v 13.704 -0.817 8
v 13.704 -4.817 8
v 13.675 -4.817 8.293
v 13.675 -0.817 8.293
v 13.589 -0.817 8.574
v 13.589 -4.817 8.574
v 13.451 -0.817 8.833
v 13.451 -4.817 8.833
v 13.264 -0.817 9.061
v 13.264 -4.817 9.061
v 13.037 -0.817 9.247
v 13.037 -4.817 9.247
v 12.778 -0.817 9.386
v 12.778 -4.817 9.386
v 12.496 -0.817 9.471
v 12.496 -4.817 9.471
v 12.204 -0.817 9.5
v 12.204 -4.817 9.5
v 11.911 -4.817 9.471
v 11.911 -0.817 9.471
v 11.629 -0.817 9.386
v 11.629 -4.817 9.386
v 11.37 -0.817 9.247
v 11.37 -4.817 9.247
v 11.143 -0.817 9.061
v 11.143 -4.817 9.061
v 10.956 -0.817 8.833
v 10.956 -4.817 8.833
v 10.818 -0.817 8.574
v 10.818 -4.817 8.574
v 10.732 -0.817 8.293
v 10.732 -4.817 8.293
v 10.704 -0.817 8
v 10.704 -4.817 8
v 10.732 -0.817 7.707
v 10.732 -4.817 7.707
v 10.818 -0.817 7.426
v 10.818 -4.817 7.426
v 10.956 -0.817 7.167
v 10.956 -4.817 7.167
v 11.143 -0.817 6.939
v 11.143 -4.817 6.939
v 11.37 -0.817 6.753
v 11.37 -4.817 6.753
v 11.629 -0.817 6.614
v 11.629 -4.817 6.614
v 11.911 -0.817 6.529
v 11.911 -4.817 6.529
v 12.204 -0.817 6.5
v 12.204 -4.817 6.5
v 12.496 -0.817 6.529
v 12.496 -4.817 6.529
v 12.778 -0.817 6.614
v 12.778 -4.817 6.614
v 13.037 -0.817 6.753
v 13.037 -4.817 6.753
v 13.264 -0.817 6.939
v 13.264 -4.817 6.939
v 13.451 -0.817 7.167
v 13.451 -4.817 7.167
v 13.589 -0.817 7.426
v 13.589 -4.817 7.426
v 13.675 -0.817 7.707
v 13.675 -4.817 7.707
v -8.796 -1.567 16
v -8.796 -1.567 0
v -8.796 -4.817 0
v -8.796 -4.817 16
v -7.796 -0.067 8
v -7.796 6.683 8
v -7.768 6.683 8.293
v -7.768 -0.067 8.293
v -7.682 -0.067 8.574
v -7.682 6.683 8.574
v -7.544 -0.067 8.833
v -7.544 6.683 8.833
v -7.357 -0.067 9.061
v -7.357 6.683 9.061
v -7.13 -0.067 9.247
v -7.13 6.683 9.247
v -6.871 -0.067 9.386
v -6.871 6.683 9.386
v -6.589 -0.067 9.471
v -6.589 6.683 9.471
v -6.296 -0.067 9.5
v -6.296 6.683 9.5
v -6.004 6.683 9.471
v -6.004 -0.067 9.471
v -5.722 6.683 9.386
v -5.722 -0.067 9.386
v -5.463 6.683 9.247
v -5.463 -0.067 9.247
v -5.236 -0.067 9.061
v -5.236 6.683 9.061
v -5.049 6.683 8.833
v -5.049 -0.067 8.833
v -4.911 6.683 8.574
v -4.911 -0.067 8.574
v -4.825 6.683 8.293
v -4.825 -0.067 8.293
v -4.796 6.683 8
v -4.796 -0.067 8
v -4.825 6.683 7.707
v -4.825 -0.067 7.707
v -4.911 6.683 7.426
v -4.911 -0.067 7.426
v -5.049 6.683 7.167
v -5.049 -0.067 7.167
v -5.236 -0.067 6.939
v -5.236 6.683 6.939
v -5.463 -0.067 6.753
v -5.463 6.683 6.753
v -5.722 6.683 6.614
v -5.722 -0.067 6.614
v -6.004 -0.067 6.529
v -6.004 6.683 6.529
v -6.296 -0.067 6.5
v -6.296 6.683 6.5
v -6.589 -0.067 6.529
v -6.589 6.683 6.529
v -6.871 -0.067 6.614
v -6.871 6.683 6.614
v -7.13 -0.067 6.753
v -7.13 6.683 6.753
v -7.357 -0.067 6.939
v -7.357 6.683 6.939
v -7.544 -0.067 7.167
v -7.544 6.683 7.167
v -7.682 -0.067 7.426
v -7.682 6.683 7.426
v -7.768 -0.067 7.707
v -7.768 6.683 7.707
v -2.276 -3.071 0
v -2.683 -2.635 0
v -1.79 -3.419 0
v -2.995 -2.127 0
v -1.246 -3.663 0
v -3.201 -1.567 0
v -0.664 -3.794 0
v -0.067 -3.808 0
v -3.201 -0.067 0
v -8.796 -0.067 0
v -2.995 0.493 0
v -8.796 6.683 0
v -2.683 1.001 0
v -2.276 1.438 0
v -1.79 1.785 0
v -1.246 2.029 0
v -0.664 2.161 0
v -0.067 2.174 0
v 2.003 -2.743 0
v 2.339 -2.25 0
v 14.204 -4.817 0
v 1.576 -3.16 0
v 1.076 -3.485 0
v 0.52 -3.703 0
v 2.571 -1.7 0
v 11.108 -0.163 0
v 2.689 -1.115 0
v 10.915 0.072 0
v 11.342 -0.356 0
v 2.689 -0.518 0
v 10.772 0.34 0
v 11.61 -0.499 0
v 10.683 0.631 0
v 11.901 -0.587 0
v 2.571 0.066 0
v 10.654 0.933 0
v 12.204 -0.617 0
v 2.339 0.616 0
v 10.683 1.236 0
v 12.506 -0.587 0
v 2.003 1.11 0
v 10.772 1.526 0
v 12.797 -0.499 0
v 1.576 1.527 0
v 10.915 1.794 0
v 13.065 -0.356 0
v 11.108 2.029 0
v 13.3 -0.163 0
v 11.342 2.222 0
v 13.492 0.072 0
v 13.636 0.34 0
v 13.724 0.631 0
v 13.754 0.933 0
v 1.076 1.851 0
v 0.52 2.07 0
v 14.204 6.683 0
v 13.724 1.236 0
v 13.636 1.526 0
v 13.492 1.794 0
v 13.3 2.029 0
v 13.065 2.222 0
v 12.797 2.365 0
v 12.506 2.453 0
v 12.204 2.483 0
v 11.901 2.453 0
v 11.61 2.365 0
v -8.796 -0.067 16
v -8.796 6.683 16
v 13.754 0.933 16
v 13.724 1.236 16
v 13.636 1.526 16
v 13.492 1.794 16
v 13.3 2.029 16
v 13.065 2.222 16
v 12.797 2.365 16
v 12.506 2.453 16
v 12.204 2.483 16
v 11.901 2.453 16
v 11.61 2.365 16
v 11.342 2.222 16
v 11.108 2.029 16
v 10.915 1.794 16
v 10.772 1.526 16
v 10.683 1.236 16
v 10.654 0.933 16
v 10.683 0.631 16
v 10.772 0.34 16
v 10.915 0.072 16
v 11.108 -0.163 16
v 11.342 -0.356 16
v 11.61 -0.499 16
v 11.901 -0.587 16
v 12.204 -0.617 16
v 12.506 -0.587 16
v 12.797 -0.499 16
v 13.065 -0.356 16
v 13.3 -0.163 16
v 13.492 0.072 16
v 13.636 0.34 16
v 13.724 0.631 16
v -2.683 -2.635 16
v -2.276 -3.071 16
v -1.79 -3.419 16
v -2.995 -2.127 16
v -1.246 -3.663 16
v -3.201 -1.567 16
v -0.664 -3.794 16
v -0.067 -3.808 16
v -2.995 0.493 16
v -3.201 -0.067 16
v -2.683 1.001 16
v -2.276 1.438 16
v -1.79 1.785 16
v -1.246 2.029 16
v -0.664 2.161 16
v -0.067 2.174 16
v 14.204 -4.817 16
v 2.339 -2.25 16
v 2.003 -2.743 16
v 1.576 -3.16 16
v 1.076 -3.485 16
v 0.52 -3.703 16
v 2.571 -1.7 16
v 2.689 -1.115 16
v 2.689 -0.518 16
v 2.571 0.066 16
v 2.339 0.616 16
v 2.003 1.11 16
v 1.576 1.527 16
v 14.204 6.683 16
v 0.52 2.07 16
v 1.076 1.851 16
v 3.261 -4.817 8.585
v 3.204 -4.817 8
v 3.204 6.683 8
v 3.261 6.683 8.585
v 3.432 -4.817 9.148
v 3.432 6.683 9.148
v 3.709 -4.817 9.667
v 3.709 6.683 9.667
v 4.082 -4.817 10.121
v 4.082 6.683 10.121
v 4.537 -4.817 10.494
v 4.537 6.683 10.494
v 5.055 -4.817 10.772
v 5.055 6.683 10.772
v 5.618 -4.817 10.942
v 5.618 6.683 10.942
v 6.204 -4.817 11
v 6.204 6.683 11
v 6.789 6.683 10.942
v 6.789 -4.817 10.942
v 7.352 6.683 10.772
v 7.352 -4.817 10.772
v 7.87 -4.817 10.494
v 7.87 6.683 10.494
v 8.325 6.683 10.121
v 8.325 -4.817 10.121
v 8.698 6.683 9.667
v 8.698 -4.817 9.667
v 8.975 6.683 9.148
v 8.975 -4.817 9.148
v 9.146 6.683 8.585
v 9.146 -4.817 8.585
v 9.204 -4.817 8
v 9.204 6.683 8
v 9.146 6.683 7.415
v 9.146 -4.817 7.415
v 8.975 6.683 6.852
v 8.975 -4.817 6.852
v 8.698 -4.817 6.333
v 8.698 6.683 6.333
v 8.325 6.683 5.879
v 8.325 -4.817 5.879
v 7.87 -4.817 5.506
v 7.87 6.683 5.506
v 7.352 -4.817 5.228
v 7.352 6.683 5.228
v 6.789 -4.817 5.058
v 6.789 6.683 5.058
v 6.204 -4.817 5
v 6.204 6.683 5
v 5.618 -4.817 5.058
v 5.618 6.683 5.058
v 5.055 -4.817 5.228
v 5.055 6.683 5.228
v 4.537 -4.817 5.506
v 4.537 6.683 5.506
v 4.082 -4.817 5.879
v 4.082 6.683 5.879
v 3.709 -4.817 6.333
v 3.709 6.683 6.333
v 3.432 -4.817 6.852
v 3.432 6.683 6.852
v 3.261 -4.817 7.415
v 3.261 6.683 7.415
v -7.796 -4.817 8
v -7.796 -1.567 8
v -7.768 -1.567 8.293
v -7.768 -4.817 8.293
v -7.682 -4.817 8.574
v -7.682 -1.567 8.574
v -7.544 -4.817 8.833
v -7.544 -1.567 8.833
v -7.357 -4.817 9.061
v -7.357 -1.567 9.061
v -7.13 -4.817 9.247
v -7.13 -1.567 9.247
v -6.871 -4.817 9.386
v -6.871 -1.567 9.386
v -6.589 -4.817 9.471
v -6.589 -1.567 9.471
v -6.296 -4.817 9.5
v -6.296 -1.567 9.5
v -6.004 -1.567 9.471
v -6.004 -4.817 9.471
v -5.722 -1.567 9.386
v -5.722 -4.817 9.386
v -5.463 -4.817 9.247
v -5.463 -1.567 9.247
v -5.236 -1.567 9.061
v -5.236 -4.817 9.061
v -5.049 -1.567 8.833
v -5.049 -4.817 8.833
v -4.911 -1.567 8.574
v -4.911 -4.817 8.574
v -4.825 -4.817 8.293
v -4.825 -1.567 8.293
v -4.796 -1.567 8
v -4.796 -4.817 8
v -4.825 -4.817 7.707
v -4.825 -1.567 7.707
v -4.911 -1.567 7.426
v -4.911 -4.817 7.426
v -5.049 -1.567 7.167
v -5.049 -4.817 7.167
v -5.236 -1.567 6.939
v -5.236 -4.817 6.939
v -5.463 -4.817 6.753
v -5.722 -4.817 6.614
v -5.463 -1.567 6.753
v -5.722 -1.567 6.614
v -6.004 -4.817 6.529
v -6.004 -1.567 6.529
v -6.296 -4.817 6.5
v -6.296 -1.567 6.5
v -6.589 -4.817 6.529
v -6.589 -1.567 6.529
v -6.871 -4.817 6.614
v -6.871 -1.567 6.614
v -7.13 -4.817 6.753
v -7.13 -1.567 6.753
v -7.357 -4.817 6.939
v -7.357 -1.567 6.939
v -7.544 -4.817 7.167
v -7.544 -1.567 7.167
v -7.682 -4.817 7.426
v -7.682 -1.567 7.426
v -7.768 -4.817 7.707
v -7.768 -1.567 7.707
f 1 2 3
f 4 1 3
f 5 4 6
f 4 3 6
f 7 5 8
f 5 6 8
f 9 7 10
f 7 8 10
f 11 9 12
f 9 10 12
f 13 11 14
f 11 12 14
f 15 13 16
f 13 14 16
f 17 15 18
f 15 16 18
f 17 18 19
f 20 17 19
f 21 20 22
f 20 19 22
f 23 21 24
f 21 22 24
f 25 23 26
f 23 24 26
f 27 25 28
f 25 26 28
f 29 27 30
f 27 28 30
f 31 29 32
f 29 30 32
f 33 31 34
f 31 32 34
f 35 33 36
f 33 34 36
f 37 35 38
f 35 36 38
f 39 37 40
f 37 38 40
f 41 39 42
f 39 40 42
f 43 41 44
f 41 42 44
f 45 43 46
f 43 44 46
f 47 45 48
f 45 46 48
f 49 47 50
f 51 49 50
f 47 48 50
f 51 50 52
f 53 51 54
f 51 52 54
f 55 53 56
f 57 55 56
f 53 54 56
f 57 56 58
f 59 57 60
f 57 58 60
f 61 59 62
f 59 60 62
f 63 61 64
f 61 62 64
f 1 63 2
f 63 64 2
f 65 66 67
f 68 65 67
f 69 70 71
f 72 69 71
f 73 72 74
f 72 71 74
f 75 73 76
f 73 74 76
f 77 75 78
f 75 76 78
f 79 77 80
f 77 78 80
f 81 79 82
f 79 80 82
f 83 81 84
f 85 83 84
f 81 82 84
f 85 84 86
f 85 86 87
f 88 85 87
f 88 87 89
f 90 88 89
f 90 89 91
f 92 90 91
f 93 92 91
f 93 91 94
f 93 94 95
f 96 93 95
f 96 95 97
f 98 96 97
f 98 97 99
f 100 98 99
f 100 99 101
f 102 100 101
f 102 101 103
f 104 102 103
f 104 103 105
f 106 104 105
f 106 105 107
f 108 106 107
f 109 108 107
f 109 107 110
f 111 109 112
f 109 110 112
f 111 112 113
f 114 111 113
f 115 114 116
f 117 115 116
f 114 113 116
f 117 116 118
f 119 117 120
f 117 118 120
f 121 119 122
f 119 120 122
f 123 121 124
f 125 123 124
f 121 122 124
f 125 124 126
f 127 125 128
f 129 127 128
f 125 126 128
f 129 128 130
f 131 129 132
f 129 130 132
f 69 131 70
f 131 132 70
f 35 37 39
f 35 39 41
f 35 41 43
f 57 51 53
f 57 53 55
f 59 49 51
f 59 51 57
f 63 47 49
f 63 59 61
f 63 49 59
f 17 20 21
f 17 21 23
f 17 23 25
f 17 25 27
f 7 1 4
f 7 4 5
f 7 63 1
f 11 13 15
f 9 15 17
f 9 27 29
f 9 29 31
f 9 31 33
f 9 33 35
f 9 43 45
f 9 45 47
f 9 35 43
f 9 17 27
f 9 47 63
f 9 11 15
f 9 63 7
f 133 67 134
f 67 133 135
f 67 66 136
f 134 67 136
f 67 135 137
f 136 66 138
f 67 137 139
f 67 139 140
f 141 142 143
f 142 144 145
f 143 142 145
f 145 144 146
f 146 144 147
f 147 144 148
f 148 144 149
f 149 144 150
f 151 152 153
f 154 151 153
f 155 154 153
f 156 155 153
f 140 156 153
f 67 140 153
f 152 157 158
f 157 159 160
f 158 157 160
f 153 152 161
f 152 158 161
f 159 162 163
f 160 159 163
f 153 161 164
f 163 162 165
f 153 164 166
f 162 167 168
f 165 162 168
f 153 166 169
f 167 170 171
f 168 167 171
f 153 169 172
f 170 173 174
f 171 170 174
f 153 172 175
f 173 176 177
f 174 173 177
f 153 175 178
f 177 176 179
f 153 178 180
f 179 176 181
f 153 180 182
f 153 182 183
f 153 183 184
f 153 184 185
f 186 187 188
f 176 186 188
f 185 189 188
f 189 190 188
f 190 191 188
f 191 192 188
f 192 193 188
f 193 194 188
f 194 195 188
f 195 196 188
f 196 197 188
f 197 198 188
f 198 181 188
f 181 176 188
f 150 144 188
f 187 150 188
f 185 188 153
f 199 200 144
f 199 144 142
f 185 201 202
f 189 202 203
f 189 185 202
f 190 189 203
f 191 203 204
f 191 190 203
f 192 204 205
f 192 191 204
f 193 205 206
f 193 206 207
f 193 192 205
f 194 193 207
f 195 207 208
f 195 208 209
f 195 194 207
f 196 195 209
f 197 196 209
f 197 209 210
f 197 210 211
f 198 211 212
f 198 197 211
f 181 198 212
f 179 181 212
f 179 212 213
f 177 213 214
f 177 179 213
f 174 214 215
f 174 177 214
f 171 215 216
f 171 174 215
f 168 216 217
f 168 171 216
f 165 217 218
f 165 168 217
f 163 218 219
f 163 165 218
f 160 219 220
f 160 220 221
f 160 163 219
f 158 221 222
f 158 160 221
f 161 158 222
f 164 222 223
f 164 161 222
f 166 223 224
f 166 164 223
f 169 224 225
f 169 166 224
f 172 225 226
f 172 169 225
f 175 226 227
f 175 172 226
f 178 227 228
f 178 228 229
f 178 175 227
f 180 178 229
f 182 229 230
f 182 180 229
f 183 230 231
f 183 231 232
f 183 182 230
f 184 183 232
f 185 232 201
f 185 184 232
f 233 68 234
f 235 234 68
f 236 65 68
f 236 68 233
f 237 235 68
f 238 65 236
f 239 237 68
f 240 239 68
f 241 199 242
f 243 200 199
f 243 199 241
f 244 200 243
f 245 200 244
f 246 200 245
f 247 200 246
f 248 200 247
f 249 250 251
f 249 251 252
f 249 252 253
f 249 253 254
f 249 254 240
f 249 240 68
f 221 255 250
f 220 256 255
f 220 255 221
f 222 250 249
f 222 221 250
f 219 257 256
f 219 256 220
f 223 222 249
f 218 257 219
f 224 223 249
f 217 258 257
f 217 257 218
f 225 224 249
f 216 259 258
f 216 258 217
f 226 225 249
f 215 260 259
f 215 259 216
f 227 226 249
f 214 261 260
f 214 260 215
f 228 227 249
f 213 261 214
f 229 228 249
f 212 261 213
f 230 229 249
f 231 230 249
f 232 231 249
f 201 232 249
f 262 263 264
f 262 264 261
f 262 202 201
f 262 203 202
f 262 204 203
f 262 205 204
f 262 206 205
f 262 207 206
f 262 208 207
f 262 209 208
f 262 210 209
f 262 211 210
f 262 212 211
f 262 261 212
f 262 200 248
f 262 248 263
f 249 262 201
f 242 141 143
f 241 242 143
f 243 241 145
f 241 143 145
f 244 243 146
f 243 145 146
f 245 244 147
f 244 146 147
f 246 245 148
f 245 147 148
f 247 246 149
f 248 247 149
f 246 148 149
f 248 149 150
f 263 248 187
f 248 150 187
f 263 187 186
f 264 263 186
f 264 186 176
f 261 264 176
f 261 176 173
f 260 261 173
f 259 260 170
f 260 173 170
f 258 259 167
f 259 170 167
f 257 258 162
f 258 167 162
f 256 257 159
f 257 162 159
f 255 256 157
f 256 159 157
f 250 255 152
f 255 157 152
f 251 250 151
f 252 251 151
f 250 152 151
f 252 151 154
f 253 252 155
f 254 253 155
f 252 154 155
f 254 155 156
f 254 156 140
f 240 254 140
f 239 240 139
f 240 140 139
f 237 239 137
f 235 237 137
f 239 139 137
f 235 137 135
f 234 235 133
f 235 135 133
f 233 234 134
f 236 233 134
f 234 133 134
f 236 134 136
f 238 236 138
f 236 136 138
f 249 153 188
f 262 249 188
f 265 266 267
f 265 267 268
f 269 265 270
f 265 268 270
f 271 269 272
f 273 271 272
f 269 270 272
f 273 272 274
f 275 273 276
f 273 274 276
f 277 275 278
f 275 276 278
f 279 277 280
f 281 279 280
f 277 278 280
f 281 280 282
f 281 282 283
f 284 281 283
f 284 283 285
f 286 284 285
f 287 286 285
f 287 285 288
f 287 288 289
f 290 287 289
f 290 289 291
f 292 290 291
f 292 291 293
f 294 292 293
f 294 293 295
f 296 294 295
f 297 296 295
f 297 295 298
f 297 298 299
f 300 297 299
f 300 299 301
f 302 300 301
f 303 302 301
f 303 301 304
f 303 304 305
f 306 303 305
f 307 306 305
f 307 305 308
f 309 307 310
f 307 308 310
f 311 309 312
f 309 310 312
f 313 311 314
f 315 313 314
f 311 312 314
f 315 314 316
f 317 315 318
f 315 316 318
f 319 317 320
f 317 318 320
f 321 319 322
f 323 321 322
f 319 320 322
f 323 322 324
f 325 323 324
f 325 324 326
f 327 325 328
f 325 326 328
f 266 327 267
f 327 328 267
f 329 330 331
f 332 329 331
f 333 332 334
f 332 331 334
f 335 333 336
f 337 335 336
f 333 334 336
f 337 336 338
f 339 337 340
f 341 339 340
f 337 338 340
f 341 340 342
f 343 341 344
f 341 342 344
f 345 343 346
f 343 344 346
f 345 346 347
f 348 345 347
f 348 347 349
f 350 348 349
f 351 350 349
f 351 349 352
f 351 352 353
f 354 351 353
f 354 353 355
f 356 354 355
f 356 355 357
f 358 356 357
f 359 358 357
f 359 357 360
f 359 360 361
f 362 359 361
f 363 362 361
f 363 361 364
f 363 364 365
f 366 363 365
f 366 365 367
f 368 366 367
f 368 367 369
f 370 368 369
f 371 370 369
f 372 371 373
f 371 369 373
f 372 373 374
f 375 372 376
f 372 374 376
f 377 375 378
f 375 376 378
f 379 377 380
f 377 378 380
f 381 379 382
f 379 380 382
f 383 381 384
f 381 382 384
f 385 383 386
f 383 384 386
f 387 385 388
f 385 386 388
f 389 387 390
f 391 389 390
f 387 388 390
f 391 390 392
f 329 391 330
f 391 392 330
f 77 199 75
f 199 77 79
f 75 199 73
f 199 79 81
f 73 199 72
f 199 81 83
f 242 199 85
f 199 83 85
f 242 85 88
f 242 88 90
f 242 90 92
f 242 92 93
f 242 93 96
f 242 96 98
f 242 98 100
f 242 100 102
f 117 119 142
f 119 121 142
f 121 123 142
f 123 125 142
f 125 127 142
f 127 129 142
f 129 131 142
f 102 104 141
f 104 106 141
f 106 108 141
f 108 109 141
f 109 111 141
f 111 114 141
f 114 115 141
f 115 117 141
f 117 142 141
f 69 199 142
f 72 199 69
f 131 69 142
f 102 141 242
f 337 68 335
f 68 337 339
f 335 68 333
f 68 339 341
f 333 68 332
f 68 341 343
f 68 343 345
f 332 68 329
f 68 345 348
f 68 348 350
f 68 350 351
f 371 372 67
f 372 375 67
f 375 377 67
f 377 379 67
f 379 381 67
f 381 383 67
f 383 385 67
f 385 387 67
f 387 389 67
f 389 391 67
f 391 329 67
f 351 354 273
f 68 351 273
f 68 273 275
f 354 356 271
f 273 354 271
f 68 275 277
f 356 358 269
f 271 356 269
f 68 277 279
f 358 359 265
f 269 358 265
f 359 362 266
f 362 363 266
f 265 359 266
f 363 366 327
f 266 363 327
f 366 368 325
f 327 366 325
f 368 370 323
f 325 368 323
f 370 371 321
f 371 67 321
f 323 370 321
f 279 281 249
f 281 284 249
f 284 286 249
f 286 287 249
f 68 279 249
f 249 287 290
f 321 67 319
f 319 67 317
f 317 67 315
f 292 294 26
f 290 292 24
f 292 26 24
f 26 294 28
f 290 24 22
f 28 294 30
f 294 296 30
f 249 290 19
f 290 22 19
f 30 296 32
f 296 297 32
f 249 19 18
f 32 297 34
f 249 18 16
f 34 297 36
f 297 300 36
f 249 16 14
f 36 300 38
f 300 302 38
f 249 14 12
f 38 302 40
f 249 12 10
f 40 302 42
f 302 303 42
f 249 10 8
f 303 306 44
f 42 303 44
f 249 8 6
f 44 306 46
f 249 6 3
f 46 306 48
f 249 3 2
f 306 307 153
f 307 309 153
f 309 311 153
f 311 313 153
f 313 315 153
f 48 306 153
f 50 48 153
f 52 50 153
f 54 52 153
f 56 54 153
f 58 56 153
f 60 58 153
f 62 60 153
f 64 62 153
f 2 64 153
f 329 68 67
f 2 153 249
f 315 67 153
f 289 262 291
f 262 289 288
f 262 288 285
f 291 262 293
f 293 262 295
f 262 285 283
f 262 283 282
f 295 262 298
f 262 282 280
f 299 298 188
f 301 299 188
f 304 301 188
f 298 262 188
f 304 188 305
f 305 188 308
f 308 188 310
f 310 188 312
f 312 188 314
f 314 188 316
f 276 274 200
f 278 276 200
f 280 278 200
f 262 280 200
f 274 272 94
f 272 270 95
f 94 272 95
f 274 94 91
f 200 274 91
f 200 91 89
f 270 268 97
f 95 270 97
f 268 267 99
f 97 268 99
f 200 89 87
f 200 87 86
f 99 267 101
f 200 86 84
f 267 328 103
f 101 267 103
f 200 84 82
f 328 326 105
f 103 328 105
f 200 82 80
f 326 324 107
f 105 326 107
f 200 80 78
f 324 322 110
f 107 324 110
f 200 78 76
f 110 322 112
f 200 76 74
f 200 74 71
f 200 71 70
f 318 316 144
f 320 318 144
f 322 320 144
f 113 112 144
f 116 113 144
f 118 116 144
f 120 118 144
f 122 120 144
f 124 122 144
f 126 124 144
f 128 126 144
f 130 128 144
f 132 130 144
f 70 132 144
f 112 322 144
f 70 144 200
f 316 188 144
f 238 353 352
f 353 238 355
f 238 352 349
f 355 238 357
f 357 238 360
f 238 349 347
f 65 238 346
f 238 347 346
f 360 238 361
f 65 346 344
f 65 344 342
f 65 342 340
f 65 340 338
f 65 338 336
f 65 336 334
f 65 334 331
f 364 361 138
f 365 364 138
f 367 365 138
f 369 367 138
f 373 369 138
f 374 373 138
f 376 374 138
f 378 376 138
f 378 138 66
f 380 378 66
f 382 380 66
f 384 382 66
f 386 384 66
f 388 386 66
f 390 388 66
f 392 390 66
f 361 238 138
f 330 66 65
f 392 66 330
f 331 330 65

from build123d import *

# Parameters (mm, degrees)
SKETCH_1_R          = 1.55
EXTRUDE_2_DEPTH     = 16
SKETCH_2_R          = 1.5
SKETCH_2_R_2        = 3
CUT_EXTRUDE_1_DEPTH = 25.289710071
SKETCH_3_R          = 1.5
CUT_EXTRUDE_2_DEPTH = 4


with BuildPart() as part:
    # 草图1 → 凸台-拉伸2 (new body)
    with BuildSketch(Plane.XY):
        with BuildLine():
            Line((14.20352123, 6.683160013), (-8.79647877, 6.683160013))
            Line((-8.79647877, 6.683160013), (-8.79647877, -0.066839987))
            Line((-8.79647877, -0.066839987), (-3.20121628, -0.066839987))
            ThreePointArc((-3.20121628, -0.066839987), (2.70352123, -0.816839987), (-3.20121628, -1.566839987))
            Line((-3.20121628, -1.566839987), (-8.79647877, -1.566839987))
            Line((-8.79647877, -1.566839987), (-8.79647877, -4.816839987))
            Line((-8.79647877, -4.816839987), (14.20352123, -4.816839987))
            Line((14.20352123, -4.816839987), (14.20352123, 6.683160013))
        make_face()
        with Locations((12.20352123, 0.933160013)):
            Circle(SKETCH_1_R, mode=Mode.SUBTRACT)
    extrude(amount=EXTRUDE_2_DEPTH)

    # 草图2 → 切除-拉伸1 (cut, through all)
    with BuildSketch(Plane(origin=(0, 6.683160013, 0), x_dir=(1, 0, 0), z_dir=(0, 1, 0))):
        with Locations(Location((-6.29647877, -8, 0), (0, 0, 180))):
            Circle(SKETCH_2_R)
        with Locations(Location((6.20352123, -8, 0), (0, 0, 180))):
            Circle(SKETCH_2_R_2)
    extrude(amount=-CUT_EXTRUDE_1_DEPTH, mode=Mode.SUBTRACT)

    # 草图3 → 切除-拉伸2 (cut)
    with BuildSketch(Plane.XZ.offset(4.816839987)):
        with Locations((12.20352123, 8)):
            Circle(SKETCH_3_R)
    extrude(amount=-CUT_EXTRUDE_2_DEPTH, mode=Mode.SUBTRACT)


solid = part.part
